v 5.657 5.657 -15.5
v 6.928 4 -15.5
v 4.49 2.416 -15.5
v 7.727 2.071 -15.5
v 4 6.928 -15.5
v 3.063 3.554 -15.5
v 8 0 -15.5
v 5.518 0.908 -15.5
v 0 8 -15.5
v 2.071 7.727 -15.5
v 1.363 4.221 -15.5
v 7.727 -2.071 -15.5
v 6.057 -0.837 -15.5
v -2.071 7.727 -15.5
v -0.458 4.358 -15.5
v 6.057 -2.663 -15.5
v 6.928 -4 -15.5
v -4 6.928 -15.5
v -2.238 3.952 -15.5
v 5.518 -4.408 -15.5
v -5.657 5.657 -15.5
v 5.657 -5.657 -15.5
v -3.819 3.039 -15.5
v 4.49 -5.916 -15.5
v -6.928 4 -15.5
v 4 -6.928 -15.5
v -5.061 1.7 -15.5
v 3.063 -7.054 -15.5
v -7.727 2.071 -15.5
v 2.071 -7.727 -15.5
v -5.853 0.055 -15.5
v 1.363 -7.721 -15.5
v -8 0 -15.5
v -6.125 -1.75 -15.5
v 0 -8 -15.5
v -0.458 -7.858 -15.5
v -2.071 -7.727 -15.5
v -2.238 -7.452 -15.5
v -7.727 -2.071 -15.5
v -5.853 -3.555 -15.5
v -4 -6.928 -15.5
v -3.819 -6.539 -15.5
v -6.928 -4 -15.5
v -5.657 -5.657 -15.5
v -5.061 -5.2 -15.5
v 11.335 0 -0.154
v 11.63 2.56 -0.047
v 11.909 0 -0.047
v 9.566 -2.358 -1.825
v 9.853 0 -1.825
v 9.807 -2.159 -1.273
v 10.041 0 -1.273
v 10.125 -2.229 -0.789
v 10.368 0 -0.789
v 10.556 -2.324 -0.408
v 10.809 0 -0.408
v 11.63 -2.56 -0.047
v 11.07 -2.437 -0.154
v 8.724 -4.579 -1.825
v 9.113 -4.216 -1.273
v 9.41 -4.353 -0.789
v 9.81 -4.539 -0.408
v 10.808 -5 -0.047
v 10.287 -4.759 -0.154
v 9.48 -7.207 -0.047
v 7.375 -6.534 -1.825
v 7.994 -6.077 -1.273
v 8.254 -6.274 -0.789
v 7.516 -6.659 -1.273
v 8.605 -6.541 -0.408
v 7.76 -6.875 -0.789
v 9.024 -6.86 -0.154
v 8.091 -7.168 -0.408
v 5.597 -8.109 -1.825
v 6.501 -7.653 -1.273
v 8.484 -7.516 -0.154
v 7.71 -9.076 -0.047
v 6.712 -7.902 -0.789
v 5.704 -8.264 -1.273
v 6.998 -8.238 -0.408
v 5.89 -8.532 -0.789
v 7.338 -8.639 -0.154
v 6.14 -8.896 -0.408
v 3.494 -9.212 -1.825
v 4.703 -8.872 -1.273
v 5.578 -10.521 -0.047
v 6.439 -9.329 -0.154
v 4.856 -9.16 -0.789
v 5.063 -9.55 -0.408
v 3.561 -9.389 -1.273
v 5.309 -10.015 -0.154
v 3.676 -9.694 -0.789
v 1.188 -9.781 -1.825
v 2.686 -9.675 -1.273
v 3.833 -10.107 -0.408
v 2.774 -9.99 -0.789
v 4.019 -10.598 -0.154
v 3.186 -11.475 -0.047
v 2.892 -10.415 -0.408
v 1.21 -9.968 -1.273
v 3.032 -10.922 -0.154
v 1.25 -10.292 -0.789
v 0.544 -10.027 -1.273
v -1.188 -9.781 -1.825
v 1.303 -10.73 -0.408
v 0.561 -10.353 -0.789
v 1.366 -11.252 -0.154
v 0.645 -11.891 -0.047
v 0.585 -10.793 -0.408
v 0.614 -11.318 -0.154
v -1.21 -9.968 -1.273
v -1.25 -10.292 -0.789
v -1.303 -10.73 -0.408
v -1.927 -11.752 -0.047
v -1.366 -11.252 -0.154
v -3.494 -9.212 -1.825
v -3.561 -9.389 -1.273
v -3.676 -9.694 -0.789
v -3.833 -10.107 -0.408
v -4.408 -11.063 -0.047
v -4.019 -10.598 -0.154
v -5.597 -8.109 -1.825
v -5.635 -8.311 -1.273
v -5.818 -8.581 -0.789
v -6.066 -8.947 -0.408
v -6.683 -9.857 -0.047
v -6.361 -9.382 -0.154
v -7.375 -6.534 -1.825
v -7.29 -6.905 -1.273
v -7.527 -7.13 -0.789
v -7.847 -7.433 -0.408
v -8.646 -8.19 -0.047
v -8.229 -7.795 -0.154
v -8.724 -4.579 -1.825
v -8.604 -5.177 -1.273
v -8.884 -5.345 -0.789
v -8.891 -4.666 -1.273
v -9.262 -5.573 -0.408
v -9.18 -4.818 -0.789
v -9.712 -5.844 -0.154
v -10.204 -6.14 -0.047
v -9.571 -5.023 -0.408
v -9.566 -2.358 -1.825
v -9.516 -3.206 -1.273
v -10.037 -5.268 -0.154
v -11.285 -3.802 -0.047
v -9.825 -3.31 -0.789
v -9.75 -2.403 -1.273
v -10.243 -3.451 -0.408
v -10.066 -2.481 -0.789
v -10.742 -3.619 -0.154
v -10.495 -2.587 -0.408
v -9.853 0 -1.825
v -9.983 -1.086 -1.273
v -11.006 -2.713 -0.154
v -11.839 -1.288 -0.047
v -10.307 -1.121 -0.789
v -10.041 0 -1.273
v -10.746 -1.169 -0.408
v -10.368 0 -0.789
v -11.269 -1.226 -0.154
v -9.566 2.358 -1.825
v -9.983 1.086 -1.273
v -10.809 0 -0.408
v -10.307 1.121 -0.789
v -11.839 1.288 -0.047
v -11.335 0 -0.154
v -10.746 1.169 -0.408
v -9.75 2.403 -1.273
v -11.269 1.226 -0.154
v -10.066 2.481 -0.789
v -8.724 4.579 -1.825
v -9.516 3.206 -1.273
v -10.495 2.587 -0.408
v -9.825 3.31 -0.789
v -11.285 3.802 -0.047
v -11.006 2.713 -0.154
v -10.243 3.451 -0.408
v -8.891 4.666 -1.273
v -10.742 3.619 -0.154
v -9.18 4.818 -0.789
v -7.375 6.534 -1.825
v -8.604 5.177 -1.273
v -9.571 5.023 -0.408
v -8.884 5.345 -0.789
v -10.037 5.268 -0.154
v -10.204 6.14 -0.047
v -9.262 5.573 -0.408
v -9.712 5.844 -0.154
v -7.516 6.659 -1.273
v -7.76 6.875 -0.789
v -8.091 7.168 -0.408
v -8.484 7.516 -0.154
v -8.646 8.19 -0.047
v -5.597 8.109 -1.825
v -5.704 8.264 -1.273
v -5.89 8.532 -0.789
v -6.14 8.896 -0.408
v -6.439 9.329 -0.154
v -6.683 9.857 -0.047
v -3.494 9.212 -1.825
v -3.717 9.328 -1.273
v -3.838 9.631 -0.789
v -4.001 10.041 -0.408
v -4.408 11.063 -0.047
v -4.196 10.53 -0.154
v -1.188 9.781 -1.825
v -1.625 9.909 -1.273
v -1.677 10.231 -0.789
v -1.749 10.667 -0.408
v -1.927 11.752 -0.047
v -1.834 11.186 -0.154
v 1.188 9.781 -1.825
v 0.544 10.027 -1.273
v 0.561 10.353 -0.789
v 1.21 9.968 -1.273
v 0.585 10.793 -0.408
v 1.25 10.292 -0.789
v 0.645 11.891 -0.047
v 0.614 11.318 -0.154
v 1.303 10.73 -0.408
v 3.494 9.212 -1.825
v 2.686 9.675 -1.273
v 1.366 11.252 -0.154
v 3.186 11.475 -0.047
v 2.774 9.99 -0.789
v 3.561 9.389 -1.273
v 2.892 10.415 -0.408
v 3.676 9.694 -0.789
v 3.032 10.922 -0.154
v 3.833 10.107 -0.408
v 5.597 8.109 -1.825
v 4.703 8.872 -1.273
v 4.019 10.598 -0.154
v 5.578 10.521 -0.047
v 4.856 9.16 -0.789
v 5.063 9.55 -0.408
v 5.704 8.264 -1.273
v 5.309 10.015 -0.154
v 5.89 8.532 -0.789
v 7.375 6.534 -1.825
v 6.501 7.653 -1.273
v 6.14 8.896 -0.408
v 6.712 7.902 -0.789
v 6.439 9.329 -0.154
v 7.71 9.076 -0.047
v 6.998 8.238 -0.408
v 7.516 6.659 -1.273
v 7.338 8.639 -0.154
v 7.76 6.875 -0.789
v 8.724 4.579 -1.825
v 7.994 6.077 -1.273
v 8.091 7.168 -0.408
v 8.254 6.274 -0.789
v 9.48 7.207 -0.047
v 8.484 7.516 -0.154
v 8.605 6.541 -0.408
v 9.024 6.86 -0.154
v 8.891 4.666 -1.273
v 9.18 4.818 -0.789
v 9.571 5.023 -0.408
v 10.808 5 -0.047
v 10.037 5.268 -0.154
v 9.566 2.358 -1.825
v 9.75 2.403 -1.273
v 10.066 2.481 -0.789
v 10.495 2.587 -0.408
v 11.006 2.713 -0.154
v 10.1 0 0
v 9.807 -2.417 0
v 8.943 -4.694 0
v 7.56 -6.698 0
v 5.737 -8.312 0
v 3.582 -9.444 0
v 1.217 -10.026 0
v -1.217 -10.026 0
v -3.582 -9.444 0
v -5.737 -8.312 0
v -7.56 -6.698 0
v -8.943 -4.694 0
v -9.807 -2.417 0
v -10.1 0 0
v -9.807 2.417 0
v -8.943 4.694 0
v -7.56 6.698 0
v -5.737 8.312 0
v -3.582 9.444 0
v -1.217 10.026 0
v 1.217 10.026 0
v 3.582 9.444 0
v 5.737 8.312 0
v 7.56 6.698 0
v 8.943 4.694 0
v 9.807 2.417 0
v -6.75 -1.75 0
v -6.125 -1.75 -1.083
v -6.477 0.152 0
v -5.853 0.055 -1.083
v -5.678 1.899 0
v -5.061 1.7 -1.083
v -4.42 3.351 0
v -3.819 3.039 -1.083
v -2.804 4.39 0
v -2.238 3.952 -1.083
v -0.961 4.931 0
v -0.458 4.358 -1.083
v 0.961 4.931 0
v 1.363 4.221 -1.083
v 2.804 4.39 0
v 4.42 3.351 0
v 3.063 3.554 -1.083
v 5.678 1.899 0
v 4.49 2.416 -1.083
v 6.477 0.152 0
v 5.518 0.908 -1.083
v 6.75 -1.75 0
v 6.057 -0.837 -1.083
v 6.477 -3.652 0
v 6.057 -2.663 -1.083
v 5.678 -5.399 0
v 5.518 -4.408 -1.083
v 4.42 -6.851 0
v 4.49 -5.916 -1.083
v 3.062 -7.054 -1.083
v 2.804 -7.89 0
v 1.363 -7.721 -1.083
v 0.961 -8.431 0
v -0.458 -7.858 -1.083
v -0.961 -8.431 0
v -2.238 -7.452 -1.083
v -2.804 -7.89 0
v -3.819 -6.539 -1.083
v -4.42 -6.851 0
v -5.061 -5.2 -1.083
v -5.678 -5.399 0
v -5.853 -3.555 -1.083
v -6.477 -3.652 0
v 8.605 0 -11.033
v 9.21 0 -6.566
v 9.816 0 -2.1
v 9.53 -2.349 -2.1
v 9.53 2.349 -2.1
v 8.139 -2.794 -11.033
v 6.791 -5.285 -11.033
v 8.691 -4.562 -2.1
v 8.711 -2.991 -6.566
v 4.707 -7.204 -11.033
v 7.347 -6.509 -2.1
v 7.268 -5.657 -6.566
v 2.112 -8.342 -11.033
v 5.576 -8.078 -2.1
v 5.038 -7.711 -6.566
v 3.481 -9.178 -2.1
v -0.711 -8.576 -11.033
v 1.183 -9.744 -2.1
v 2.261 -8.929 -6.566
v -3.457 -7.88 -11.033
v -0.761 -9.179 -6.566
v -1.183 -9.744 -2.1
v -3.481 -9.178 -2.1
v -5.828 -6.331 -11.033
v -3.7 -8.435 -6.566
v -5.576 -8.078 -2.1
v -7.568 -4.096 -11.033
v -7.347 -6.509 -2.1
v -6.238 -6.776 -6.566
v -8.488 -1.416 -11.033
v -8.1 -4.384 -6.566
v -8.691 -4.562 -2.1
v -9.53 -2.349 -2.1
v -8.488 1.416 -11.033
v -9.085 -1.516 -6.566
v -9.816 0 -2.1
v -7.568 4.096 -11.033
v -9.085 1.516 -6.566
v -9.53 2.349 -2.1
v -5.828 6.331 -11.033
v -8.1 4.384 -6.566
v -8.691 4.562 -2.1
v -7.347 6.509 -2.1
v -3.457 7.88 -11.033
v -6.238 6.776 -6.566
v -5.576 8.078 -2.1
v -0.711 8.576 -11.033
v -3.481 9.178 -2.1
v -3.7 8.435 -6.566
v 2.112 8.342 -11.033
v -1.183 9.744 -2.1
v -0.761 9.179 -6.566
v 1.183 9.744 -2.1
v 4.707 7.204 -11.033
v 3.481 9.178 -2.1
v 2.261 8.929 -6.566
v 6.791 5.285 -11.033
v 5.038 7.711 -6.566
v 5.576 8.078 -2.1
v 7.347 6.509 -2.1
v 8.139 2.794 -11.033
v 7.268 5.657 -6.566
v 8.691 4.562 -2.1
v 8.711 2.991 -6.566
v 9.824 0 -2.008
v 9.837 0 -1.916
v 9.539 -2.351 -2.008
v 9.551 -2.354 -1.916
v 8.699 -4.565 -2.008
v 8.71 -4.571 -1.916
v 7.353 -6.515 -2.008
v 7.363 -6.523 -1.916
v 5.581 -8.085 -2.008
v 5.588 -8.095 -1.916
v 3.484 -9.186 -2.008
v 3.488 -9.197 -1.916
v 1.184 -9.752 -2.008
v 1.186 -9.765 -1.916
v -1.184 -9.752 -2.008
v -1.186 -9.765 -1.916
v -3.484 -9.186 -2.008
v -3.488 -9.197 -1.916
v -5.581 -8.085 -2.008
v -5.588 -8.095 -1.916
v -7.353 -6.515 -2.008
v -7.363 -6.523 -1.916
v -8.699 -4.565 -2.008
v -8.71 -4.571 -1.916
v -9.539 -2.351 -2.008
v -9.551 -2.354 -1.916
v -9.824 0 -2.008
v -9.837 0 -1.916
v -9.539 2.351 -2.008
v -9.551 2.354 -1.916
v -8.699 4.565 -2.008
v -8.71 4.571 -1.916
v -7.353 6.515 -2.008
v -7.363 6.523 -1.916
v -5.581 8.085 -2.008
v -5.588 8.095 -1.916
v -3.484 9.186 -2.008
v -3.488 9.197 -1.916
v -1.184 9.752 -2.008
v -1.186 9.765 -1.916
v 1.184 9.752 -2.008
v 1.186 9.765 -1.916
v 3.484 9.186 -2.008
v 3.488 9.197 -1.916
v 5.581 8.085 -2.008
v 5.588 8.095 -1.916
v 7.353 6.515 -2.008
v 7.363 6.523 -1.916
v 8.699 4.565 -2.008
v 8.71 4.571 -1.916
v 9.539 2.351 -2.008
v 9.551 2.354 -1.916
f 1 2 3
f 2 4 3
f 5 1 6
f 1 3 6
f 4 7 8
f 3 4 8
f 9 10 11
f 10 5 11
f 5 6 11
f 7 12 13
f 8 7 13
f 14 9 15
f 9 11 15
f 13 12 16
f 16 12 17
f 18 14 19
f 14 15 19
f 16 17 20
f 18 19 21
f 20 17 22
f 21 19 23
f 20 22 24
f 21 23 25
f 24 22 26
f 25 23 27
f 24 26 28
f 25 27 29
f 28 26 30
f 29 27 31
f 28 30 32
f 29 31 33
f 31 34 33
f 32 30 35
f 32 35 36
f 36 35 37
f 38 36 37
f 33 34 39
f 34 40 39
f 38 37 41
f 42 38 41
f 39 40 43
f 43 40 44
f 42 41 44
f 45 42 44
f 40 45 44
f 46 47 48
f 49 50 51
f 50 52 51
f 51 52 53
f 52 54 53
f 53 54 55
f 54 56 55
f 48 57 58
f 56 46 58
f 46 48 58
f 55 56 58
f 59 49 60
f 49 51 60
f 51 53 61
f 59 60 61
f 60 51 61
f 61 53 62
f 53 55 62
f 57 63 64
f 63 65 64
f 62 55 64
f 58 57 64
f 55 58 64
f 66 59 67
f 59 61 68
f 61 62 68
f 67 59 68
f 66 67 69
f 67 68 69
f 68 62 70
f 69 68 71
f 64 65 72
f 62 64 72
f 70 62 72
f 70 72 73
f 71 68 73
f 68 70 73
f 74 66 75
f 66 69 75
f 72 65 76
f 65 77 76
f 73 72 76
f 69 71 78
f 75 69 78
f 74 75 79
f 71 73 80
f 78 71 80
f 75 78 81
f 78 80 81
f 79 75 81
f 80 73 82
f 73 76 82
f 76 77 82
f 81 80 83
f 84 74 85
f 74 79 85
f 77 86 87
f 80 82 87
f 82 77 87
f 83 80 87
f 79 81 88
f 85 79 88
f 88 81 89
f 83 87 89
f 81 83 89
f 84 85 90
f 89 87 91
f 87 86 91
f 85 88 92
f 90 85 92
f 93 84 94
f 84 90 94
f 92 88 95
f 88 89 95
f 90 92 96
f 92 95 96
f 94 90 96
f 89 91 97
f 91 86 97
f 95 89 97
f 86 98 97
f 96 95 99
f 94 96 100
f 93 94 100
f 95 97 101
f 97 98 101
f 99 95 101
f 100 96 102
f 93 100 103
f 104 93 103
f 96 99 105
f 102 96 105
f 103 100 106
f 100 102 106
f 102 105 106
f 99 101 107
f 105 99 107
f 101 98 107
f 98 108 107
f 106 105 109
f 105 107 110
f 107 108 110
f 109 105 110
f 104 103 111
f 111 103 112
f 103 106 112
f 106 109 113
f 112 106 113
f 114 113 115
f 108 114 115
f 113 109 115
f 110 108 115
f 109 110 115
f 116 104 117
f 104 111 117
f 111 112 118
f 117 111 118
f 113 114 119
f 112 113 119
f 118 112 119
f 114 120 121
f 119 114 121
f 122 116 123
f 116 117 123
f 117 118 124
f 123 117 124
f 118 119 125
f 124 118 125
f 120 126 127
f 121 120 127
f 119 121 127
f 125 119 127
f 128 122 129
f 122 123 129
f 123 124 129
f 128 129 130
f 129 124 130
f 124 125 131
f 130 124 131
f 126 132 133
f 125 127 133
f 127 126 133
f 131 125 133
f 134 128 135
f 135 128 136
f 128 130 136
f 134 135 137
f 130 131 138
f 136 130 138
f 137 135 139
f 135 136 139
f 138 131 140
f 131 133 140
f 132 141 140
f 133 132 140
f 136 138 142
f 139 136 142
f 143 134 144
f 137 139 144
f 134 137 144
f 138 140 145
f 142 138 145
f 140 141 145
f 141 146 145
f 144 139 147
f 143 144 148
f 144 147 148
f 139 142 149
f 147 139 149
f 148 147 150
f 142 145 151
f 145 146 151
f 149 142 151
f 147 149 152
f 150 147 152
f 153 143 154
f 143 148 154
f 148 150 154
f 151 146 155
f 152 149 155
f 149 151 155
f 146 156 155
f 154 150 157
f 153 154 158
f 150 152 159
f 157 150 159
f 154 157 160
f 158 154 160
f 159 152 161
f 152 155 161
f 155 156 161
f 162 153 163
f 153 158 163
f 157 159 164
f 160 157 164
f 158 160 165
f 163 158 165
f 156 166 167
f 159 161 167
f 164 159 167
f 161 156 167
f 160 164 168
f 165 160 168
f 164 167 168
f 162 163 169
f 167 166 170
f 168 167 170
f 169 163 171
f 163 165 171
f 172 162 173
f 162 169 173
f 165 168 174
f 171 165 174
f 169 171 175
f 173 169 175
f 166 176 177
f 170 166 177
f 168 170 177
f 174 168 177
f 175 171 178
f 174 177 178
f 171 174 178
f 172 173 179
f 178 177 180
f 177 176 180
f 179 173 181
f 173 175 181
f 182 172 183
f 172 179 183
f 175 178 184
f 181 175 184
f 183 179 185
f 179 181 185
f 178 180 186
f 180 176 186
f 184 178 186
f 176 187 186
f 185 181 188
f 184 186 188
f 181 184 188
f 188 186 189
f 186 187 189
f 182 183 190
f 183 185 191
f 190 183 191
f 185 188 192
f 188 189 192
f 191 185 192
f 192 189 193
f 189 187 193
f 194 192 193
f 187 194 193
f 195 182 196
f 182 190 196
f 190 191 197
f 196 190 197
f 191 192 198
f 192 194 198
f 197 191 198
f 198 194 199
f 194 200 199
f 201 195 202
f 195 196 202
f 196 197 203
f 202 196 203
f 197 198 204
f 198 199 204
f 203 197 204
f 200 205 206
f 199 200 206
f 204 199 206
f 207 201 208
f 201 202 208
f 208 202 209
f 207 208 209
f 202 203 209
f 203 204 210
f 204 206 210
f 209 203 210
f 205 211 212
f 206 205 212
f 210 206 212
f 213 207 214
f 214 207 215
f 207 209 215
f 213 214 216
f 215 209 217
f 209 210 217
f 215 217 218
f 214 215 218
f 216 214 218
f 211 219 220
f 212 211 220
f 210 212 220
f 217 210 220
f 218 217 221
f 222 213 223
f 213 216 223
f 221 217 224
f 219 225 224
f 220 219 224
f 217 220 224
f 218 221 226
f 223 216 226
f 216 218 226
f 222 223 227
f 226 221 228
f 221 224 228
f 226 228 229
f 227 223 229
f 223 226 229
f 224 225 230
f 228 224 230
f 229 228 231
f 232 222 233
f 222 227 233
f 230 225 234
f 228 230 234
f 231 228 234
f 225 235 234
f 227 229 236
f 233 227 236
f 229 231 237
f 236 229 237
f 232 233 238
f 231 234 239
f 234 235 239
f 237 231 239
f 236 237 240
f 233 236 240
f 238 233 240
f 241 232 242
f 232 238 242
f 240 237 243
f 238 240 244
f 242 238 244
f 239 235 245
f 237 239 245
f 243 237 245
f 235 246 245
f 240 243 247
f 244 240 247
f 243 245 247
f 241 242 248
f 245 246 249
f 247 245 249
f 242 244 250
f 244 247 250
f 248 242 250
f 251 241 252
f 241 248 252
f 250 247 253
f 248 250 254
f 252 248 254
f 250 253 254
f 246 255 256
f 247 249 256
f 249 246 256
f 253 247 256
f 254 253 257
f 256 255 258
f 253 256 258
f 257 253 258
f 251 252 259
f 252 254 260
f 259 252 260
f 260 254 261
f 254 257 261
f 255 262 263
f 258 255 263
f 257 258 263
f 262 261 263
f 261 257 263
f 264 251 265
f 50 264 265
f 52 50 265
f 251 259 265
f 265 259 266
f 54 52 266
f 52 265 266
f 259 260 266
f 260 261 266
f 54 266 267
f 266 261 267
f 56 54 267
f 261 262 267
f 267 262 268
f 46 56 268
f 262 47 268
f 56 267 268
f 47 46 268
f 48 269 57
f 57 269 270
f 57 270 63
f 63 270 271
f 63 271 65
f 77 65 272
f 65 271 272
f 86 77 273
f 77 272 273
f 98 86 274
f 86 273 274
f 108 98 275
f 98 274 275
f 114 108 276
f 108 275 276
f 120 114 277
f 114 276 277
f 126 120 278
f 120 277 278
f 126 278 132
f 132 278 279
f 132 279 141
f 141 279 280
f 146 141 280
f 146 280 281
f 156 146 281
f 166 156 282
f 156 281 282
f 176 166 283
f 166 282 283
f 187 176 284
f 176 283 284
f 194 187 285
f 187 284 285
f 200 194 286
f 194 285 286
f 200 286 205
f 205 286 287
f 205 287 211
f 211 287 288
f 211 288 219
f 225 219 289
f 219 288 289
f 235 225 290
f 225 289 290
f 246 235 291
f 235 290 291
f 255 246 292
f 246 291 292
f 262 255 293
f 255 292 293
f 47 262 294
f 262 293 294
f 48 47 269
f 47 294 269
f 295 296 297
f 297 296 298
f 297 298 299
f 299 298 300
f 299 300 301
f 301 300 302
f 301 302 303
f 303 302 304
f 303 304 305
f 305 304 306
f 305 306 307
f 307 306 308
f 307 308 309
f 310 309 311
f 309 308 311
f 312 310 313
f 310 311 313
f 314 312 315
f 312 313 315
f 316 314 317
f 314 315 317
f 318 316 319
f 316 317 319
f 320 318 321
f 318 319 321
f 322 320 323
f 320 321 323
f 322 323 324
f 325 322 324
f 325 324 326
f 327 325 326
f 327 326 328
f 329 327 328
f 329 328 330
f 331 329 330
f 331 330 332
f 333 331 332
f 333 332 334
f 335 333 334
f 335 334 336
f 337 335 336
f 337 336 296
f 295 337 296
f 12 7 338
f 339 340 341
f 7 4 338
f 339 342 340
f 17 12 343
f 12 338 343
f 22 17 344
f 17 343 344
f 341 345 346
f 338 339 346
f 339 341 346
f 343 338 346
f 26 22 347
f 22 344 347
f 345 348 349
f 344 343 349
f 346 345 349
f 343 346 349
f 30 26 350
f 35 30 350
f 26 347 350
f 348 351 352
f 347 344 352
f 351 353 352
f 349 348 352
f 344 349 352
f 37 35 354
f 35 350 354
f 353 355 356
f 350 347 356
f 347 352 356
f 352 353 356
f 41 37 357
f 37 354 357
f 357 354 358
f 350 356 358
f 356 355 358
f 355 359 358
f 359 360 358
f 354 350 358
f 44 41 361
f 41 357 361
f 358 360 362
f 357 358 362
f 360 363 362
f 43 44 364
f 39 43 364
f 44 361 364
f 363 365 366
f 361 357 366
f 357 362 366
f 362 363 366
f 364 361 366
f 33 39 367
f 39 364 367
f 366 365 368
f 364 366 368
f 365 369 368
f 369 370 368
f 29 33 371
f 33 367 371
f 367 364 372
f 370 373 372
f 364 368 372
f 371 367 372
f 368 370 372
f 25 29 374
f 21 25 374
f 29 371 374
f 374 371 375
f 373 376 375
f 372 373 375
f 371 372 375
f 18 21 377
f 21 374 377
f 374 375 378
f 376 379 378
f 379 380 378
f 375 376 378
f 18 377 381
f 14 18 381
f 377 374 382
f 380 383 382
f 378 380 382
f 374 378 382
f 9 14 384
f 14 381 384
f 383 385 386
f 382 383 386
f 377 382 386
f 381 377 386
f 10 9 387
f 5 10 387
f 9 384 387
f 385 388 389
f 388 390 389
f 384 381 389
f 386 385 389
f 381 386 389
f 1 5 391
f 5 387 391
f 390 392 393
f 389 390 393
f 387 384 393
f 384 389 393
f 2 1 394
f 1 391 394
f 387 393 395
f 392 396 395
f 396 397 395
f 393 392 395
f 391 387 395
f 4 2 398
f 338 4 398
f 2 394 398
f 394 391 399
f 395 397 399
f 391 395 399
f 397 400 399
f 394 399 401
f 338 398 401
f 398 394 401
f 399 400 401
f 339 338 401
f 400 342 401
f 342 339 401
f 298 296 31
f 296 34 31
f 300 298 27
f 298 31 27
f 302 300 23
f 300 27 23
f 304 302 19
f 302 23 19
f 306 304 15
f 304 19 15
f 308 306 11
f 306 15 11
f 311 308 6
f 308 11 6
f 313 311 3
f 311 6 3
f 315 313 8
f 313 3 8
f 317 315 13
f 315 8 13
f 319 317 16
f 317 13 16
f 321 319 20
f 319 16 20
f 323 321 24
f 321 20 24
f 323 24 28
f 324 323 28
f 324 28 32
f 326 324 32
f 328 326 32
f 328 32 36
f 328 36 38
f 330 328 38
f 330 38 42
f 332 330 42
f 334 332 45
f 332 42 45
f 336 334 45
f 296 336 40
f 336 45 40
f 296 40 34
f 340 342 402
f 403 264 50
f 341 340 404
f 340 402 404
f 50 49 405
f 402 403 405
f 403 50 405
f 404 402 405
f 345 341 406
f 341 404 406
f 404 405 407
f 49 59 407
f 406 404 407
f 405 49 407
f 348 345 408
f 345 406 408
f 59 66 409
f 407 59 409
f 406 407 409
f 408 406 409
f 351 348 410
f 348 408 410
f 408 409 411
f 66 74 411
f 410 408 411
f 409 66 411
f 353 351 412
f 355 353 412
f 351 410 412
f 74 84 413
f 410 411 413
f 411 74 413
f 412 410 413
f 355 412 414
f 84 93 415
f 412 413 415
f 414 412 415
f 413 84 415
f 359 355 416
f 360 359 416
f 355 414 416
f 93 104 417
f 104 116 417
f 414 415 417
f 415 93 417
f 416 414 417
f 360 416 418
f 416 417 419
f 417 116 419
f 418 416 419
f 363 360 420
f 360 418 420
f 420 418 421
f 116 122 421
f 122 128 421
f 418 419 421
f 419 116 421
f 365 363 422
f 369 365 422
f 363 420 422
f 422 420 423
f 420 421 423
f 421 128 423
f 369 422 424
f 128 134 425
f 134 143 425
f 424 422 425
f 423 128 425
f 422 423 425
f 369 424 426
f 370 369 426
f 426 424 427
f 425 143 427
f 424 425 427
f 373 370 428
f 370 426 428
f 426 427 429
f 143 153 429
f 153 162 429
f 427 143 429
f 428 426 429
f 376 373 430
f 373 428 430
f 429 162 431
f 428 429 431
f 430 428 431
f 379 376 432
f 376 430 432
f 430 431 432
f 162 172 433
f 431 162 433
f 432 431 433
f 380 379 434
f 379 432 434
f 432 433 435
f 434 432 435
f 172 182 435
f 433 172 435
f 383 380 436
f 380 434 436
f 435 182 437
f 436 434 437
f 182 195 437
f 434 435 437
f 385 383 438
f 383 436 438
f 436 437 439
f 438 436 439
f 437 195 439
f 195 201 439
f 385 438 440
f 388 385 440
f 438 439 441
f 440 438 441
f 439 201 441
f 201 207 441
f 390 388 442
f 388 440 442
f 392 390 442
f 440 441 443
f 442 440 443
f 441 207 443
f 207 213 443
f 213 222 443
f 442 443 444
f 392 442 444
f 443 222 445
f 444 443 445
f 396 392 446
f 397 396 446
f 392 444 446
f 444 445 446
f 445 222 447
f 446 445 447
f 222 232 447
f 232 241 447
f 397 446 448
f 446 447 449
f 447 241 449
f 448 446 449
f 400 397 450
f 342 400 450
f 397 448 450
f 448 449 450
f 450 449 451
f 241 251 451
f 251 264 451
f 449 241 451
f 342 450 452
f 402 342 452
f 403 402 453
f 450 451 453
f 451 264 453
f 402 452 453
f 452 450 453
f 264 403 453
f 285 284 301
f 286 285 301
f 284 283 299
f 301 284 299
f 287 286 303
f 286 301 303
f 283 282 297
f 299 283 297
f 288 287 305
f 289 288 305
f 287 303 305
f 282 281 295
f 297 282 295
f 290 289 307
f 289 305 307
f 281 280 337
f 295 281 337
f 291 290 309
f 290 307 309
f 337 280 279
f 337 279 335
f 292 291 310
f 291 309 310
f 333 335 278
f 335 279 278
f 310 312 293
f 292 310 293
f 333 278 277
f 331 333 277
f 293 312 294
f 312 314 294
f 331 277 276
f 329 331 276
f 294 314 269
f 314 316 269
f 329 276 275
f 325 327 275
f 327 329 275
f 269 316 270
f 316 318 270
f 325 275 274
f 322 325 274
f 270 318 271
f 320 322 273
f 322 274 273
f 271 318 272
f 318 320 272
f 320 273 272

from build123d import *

# Parameters (mm, degrees)
F3_D           = 12.25
F3_CSINK_D     = 13.5
F3_CSINK_ANGLE = 60


with BuildPart() as f1:
    # F0 (on Front) → F1 (revolve)
    with BuildSketch(Plane.XZ):
        with BuildLine():
            Line((10.1, 0), (0, 0))
            Line((0, 0), (0, -15.5))
            Line((0, -15.5), (8, -15.5))
            Line((8, -15.5), (9.81555, -2.099511))
            ThreePointArc((9.81555, -2.099511), (9.829834, -1.961906), (9.85268, -1.82546))
            Line((9.85268, -1.82546), (10.1, 0))
        make_face()
        with BuildLine():
            Line((11.908681, -0.047055), (10.1, 0))
            Line((10.1, 0), (9.85268, -1.82546))
            ThreePointArc((9.85268, -1.82546), (10.575835, -0.583828), (11.908681, -0.047055))
        make_face()
    revolve(axis=Axis((0, 0, -7.75), (0, 0, -1)))

    # F3 (through all)
    with Locations(Plane.XY):
        with Locations((0, -1.75)):
            CounterSinkHole(F3_D / 2, F3_CSINK_D / 2, counter_sink_angle=F3_CSINK_ANGLE)


solid = f1.part
